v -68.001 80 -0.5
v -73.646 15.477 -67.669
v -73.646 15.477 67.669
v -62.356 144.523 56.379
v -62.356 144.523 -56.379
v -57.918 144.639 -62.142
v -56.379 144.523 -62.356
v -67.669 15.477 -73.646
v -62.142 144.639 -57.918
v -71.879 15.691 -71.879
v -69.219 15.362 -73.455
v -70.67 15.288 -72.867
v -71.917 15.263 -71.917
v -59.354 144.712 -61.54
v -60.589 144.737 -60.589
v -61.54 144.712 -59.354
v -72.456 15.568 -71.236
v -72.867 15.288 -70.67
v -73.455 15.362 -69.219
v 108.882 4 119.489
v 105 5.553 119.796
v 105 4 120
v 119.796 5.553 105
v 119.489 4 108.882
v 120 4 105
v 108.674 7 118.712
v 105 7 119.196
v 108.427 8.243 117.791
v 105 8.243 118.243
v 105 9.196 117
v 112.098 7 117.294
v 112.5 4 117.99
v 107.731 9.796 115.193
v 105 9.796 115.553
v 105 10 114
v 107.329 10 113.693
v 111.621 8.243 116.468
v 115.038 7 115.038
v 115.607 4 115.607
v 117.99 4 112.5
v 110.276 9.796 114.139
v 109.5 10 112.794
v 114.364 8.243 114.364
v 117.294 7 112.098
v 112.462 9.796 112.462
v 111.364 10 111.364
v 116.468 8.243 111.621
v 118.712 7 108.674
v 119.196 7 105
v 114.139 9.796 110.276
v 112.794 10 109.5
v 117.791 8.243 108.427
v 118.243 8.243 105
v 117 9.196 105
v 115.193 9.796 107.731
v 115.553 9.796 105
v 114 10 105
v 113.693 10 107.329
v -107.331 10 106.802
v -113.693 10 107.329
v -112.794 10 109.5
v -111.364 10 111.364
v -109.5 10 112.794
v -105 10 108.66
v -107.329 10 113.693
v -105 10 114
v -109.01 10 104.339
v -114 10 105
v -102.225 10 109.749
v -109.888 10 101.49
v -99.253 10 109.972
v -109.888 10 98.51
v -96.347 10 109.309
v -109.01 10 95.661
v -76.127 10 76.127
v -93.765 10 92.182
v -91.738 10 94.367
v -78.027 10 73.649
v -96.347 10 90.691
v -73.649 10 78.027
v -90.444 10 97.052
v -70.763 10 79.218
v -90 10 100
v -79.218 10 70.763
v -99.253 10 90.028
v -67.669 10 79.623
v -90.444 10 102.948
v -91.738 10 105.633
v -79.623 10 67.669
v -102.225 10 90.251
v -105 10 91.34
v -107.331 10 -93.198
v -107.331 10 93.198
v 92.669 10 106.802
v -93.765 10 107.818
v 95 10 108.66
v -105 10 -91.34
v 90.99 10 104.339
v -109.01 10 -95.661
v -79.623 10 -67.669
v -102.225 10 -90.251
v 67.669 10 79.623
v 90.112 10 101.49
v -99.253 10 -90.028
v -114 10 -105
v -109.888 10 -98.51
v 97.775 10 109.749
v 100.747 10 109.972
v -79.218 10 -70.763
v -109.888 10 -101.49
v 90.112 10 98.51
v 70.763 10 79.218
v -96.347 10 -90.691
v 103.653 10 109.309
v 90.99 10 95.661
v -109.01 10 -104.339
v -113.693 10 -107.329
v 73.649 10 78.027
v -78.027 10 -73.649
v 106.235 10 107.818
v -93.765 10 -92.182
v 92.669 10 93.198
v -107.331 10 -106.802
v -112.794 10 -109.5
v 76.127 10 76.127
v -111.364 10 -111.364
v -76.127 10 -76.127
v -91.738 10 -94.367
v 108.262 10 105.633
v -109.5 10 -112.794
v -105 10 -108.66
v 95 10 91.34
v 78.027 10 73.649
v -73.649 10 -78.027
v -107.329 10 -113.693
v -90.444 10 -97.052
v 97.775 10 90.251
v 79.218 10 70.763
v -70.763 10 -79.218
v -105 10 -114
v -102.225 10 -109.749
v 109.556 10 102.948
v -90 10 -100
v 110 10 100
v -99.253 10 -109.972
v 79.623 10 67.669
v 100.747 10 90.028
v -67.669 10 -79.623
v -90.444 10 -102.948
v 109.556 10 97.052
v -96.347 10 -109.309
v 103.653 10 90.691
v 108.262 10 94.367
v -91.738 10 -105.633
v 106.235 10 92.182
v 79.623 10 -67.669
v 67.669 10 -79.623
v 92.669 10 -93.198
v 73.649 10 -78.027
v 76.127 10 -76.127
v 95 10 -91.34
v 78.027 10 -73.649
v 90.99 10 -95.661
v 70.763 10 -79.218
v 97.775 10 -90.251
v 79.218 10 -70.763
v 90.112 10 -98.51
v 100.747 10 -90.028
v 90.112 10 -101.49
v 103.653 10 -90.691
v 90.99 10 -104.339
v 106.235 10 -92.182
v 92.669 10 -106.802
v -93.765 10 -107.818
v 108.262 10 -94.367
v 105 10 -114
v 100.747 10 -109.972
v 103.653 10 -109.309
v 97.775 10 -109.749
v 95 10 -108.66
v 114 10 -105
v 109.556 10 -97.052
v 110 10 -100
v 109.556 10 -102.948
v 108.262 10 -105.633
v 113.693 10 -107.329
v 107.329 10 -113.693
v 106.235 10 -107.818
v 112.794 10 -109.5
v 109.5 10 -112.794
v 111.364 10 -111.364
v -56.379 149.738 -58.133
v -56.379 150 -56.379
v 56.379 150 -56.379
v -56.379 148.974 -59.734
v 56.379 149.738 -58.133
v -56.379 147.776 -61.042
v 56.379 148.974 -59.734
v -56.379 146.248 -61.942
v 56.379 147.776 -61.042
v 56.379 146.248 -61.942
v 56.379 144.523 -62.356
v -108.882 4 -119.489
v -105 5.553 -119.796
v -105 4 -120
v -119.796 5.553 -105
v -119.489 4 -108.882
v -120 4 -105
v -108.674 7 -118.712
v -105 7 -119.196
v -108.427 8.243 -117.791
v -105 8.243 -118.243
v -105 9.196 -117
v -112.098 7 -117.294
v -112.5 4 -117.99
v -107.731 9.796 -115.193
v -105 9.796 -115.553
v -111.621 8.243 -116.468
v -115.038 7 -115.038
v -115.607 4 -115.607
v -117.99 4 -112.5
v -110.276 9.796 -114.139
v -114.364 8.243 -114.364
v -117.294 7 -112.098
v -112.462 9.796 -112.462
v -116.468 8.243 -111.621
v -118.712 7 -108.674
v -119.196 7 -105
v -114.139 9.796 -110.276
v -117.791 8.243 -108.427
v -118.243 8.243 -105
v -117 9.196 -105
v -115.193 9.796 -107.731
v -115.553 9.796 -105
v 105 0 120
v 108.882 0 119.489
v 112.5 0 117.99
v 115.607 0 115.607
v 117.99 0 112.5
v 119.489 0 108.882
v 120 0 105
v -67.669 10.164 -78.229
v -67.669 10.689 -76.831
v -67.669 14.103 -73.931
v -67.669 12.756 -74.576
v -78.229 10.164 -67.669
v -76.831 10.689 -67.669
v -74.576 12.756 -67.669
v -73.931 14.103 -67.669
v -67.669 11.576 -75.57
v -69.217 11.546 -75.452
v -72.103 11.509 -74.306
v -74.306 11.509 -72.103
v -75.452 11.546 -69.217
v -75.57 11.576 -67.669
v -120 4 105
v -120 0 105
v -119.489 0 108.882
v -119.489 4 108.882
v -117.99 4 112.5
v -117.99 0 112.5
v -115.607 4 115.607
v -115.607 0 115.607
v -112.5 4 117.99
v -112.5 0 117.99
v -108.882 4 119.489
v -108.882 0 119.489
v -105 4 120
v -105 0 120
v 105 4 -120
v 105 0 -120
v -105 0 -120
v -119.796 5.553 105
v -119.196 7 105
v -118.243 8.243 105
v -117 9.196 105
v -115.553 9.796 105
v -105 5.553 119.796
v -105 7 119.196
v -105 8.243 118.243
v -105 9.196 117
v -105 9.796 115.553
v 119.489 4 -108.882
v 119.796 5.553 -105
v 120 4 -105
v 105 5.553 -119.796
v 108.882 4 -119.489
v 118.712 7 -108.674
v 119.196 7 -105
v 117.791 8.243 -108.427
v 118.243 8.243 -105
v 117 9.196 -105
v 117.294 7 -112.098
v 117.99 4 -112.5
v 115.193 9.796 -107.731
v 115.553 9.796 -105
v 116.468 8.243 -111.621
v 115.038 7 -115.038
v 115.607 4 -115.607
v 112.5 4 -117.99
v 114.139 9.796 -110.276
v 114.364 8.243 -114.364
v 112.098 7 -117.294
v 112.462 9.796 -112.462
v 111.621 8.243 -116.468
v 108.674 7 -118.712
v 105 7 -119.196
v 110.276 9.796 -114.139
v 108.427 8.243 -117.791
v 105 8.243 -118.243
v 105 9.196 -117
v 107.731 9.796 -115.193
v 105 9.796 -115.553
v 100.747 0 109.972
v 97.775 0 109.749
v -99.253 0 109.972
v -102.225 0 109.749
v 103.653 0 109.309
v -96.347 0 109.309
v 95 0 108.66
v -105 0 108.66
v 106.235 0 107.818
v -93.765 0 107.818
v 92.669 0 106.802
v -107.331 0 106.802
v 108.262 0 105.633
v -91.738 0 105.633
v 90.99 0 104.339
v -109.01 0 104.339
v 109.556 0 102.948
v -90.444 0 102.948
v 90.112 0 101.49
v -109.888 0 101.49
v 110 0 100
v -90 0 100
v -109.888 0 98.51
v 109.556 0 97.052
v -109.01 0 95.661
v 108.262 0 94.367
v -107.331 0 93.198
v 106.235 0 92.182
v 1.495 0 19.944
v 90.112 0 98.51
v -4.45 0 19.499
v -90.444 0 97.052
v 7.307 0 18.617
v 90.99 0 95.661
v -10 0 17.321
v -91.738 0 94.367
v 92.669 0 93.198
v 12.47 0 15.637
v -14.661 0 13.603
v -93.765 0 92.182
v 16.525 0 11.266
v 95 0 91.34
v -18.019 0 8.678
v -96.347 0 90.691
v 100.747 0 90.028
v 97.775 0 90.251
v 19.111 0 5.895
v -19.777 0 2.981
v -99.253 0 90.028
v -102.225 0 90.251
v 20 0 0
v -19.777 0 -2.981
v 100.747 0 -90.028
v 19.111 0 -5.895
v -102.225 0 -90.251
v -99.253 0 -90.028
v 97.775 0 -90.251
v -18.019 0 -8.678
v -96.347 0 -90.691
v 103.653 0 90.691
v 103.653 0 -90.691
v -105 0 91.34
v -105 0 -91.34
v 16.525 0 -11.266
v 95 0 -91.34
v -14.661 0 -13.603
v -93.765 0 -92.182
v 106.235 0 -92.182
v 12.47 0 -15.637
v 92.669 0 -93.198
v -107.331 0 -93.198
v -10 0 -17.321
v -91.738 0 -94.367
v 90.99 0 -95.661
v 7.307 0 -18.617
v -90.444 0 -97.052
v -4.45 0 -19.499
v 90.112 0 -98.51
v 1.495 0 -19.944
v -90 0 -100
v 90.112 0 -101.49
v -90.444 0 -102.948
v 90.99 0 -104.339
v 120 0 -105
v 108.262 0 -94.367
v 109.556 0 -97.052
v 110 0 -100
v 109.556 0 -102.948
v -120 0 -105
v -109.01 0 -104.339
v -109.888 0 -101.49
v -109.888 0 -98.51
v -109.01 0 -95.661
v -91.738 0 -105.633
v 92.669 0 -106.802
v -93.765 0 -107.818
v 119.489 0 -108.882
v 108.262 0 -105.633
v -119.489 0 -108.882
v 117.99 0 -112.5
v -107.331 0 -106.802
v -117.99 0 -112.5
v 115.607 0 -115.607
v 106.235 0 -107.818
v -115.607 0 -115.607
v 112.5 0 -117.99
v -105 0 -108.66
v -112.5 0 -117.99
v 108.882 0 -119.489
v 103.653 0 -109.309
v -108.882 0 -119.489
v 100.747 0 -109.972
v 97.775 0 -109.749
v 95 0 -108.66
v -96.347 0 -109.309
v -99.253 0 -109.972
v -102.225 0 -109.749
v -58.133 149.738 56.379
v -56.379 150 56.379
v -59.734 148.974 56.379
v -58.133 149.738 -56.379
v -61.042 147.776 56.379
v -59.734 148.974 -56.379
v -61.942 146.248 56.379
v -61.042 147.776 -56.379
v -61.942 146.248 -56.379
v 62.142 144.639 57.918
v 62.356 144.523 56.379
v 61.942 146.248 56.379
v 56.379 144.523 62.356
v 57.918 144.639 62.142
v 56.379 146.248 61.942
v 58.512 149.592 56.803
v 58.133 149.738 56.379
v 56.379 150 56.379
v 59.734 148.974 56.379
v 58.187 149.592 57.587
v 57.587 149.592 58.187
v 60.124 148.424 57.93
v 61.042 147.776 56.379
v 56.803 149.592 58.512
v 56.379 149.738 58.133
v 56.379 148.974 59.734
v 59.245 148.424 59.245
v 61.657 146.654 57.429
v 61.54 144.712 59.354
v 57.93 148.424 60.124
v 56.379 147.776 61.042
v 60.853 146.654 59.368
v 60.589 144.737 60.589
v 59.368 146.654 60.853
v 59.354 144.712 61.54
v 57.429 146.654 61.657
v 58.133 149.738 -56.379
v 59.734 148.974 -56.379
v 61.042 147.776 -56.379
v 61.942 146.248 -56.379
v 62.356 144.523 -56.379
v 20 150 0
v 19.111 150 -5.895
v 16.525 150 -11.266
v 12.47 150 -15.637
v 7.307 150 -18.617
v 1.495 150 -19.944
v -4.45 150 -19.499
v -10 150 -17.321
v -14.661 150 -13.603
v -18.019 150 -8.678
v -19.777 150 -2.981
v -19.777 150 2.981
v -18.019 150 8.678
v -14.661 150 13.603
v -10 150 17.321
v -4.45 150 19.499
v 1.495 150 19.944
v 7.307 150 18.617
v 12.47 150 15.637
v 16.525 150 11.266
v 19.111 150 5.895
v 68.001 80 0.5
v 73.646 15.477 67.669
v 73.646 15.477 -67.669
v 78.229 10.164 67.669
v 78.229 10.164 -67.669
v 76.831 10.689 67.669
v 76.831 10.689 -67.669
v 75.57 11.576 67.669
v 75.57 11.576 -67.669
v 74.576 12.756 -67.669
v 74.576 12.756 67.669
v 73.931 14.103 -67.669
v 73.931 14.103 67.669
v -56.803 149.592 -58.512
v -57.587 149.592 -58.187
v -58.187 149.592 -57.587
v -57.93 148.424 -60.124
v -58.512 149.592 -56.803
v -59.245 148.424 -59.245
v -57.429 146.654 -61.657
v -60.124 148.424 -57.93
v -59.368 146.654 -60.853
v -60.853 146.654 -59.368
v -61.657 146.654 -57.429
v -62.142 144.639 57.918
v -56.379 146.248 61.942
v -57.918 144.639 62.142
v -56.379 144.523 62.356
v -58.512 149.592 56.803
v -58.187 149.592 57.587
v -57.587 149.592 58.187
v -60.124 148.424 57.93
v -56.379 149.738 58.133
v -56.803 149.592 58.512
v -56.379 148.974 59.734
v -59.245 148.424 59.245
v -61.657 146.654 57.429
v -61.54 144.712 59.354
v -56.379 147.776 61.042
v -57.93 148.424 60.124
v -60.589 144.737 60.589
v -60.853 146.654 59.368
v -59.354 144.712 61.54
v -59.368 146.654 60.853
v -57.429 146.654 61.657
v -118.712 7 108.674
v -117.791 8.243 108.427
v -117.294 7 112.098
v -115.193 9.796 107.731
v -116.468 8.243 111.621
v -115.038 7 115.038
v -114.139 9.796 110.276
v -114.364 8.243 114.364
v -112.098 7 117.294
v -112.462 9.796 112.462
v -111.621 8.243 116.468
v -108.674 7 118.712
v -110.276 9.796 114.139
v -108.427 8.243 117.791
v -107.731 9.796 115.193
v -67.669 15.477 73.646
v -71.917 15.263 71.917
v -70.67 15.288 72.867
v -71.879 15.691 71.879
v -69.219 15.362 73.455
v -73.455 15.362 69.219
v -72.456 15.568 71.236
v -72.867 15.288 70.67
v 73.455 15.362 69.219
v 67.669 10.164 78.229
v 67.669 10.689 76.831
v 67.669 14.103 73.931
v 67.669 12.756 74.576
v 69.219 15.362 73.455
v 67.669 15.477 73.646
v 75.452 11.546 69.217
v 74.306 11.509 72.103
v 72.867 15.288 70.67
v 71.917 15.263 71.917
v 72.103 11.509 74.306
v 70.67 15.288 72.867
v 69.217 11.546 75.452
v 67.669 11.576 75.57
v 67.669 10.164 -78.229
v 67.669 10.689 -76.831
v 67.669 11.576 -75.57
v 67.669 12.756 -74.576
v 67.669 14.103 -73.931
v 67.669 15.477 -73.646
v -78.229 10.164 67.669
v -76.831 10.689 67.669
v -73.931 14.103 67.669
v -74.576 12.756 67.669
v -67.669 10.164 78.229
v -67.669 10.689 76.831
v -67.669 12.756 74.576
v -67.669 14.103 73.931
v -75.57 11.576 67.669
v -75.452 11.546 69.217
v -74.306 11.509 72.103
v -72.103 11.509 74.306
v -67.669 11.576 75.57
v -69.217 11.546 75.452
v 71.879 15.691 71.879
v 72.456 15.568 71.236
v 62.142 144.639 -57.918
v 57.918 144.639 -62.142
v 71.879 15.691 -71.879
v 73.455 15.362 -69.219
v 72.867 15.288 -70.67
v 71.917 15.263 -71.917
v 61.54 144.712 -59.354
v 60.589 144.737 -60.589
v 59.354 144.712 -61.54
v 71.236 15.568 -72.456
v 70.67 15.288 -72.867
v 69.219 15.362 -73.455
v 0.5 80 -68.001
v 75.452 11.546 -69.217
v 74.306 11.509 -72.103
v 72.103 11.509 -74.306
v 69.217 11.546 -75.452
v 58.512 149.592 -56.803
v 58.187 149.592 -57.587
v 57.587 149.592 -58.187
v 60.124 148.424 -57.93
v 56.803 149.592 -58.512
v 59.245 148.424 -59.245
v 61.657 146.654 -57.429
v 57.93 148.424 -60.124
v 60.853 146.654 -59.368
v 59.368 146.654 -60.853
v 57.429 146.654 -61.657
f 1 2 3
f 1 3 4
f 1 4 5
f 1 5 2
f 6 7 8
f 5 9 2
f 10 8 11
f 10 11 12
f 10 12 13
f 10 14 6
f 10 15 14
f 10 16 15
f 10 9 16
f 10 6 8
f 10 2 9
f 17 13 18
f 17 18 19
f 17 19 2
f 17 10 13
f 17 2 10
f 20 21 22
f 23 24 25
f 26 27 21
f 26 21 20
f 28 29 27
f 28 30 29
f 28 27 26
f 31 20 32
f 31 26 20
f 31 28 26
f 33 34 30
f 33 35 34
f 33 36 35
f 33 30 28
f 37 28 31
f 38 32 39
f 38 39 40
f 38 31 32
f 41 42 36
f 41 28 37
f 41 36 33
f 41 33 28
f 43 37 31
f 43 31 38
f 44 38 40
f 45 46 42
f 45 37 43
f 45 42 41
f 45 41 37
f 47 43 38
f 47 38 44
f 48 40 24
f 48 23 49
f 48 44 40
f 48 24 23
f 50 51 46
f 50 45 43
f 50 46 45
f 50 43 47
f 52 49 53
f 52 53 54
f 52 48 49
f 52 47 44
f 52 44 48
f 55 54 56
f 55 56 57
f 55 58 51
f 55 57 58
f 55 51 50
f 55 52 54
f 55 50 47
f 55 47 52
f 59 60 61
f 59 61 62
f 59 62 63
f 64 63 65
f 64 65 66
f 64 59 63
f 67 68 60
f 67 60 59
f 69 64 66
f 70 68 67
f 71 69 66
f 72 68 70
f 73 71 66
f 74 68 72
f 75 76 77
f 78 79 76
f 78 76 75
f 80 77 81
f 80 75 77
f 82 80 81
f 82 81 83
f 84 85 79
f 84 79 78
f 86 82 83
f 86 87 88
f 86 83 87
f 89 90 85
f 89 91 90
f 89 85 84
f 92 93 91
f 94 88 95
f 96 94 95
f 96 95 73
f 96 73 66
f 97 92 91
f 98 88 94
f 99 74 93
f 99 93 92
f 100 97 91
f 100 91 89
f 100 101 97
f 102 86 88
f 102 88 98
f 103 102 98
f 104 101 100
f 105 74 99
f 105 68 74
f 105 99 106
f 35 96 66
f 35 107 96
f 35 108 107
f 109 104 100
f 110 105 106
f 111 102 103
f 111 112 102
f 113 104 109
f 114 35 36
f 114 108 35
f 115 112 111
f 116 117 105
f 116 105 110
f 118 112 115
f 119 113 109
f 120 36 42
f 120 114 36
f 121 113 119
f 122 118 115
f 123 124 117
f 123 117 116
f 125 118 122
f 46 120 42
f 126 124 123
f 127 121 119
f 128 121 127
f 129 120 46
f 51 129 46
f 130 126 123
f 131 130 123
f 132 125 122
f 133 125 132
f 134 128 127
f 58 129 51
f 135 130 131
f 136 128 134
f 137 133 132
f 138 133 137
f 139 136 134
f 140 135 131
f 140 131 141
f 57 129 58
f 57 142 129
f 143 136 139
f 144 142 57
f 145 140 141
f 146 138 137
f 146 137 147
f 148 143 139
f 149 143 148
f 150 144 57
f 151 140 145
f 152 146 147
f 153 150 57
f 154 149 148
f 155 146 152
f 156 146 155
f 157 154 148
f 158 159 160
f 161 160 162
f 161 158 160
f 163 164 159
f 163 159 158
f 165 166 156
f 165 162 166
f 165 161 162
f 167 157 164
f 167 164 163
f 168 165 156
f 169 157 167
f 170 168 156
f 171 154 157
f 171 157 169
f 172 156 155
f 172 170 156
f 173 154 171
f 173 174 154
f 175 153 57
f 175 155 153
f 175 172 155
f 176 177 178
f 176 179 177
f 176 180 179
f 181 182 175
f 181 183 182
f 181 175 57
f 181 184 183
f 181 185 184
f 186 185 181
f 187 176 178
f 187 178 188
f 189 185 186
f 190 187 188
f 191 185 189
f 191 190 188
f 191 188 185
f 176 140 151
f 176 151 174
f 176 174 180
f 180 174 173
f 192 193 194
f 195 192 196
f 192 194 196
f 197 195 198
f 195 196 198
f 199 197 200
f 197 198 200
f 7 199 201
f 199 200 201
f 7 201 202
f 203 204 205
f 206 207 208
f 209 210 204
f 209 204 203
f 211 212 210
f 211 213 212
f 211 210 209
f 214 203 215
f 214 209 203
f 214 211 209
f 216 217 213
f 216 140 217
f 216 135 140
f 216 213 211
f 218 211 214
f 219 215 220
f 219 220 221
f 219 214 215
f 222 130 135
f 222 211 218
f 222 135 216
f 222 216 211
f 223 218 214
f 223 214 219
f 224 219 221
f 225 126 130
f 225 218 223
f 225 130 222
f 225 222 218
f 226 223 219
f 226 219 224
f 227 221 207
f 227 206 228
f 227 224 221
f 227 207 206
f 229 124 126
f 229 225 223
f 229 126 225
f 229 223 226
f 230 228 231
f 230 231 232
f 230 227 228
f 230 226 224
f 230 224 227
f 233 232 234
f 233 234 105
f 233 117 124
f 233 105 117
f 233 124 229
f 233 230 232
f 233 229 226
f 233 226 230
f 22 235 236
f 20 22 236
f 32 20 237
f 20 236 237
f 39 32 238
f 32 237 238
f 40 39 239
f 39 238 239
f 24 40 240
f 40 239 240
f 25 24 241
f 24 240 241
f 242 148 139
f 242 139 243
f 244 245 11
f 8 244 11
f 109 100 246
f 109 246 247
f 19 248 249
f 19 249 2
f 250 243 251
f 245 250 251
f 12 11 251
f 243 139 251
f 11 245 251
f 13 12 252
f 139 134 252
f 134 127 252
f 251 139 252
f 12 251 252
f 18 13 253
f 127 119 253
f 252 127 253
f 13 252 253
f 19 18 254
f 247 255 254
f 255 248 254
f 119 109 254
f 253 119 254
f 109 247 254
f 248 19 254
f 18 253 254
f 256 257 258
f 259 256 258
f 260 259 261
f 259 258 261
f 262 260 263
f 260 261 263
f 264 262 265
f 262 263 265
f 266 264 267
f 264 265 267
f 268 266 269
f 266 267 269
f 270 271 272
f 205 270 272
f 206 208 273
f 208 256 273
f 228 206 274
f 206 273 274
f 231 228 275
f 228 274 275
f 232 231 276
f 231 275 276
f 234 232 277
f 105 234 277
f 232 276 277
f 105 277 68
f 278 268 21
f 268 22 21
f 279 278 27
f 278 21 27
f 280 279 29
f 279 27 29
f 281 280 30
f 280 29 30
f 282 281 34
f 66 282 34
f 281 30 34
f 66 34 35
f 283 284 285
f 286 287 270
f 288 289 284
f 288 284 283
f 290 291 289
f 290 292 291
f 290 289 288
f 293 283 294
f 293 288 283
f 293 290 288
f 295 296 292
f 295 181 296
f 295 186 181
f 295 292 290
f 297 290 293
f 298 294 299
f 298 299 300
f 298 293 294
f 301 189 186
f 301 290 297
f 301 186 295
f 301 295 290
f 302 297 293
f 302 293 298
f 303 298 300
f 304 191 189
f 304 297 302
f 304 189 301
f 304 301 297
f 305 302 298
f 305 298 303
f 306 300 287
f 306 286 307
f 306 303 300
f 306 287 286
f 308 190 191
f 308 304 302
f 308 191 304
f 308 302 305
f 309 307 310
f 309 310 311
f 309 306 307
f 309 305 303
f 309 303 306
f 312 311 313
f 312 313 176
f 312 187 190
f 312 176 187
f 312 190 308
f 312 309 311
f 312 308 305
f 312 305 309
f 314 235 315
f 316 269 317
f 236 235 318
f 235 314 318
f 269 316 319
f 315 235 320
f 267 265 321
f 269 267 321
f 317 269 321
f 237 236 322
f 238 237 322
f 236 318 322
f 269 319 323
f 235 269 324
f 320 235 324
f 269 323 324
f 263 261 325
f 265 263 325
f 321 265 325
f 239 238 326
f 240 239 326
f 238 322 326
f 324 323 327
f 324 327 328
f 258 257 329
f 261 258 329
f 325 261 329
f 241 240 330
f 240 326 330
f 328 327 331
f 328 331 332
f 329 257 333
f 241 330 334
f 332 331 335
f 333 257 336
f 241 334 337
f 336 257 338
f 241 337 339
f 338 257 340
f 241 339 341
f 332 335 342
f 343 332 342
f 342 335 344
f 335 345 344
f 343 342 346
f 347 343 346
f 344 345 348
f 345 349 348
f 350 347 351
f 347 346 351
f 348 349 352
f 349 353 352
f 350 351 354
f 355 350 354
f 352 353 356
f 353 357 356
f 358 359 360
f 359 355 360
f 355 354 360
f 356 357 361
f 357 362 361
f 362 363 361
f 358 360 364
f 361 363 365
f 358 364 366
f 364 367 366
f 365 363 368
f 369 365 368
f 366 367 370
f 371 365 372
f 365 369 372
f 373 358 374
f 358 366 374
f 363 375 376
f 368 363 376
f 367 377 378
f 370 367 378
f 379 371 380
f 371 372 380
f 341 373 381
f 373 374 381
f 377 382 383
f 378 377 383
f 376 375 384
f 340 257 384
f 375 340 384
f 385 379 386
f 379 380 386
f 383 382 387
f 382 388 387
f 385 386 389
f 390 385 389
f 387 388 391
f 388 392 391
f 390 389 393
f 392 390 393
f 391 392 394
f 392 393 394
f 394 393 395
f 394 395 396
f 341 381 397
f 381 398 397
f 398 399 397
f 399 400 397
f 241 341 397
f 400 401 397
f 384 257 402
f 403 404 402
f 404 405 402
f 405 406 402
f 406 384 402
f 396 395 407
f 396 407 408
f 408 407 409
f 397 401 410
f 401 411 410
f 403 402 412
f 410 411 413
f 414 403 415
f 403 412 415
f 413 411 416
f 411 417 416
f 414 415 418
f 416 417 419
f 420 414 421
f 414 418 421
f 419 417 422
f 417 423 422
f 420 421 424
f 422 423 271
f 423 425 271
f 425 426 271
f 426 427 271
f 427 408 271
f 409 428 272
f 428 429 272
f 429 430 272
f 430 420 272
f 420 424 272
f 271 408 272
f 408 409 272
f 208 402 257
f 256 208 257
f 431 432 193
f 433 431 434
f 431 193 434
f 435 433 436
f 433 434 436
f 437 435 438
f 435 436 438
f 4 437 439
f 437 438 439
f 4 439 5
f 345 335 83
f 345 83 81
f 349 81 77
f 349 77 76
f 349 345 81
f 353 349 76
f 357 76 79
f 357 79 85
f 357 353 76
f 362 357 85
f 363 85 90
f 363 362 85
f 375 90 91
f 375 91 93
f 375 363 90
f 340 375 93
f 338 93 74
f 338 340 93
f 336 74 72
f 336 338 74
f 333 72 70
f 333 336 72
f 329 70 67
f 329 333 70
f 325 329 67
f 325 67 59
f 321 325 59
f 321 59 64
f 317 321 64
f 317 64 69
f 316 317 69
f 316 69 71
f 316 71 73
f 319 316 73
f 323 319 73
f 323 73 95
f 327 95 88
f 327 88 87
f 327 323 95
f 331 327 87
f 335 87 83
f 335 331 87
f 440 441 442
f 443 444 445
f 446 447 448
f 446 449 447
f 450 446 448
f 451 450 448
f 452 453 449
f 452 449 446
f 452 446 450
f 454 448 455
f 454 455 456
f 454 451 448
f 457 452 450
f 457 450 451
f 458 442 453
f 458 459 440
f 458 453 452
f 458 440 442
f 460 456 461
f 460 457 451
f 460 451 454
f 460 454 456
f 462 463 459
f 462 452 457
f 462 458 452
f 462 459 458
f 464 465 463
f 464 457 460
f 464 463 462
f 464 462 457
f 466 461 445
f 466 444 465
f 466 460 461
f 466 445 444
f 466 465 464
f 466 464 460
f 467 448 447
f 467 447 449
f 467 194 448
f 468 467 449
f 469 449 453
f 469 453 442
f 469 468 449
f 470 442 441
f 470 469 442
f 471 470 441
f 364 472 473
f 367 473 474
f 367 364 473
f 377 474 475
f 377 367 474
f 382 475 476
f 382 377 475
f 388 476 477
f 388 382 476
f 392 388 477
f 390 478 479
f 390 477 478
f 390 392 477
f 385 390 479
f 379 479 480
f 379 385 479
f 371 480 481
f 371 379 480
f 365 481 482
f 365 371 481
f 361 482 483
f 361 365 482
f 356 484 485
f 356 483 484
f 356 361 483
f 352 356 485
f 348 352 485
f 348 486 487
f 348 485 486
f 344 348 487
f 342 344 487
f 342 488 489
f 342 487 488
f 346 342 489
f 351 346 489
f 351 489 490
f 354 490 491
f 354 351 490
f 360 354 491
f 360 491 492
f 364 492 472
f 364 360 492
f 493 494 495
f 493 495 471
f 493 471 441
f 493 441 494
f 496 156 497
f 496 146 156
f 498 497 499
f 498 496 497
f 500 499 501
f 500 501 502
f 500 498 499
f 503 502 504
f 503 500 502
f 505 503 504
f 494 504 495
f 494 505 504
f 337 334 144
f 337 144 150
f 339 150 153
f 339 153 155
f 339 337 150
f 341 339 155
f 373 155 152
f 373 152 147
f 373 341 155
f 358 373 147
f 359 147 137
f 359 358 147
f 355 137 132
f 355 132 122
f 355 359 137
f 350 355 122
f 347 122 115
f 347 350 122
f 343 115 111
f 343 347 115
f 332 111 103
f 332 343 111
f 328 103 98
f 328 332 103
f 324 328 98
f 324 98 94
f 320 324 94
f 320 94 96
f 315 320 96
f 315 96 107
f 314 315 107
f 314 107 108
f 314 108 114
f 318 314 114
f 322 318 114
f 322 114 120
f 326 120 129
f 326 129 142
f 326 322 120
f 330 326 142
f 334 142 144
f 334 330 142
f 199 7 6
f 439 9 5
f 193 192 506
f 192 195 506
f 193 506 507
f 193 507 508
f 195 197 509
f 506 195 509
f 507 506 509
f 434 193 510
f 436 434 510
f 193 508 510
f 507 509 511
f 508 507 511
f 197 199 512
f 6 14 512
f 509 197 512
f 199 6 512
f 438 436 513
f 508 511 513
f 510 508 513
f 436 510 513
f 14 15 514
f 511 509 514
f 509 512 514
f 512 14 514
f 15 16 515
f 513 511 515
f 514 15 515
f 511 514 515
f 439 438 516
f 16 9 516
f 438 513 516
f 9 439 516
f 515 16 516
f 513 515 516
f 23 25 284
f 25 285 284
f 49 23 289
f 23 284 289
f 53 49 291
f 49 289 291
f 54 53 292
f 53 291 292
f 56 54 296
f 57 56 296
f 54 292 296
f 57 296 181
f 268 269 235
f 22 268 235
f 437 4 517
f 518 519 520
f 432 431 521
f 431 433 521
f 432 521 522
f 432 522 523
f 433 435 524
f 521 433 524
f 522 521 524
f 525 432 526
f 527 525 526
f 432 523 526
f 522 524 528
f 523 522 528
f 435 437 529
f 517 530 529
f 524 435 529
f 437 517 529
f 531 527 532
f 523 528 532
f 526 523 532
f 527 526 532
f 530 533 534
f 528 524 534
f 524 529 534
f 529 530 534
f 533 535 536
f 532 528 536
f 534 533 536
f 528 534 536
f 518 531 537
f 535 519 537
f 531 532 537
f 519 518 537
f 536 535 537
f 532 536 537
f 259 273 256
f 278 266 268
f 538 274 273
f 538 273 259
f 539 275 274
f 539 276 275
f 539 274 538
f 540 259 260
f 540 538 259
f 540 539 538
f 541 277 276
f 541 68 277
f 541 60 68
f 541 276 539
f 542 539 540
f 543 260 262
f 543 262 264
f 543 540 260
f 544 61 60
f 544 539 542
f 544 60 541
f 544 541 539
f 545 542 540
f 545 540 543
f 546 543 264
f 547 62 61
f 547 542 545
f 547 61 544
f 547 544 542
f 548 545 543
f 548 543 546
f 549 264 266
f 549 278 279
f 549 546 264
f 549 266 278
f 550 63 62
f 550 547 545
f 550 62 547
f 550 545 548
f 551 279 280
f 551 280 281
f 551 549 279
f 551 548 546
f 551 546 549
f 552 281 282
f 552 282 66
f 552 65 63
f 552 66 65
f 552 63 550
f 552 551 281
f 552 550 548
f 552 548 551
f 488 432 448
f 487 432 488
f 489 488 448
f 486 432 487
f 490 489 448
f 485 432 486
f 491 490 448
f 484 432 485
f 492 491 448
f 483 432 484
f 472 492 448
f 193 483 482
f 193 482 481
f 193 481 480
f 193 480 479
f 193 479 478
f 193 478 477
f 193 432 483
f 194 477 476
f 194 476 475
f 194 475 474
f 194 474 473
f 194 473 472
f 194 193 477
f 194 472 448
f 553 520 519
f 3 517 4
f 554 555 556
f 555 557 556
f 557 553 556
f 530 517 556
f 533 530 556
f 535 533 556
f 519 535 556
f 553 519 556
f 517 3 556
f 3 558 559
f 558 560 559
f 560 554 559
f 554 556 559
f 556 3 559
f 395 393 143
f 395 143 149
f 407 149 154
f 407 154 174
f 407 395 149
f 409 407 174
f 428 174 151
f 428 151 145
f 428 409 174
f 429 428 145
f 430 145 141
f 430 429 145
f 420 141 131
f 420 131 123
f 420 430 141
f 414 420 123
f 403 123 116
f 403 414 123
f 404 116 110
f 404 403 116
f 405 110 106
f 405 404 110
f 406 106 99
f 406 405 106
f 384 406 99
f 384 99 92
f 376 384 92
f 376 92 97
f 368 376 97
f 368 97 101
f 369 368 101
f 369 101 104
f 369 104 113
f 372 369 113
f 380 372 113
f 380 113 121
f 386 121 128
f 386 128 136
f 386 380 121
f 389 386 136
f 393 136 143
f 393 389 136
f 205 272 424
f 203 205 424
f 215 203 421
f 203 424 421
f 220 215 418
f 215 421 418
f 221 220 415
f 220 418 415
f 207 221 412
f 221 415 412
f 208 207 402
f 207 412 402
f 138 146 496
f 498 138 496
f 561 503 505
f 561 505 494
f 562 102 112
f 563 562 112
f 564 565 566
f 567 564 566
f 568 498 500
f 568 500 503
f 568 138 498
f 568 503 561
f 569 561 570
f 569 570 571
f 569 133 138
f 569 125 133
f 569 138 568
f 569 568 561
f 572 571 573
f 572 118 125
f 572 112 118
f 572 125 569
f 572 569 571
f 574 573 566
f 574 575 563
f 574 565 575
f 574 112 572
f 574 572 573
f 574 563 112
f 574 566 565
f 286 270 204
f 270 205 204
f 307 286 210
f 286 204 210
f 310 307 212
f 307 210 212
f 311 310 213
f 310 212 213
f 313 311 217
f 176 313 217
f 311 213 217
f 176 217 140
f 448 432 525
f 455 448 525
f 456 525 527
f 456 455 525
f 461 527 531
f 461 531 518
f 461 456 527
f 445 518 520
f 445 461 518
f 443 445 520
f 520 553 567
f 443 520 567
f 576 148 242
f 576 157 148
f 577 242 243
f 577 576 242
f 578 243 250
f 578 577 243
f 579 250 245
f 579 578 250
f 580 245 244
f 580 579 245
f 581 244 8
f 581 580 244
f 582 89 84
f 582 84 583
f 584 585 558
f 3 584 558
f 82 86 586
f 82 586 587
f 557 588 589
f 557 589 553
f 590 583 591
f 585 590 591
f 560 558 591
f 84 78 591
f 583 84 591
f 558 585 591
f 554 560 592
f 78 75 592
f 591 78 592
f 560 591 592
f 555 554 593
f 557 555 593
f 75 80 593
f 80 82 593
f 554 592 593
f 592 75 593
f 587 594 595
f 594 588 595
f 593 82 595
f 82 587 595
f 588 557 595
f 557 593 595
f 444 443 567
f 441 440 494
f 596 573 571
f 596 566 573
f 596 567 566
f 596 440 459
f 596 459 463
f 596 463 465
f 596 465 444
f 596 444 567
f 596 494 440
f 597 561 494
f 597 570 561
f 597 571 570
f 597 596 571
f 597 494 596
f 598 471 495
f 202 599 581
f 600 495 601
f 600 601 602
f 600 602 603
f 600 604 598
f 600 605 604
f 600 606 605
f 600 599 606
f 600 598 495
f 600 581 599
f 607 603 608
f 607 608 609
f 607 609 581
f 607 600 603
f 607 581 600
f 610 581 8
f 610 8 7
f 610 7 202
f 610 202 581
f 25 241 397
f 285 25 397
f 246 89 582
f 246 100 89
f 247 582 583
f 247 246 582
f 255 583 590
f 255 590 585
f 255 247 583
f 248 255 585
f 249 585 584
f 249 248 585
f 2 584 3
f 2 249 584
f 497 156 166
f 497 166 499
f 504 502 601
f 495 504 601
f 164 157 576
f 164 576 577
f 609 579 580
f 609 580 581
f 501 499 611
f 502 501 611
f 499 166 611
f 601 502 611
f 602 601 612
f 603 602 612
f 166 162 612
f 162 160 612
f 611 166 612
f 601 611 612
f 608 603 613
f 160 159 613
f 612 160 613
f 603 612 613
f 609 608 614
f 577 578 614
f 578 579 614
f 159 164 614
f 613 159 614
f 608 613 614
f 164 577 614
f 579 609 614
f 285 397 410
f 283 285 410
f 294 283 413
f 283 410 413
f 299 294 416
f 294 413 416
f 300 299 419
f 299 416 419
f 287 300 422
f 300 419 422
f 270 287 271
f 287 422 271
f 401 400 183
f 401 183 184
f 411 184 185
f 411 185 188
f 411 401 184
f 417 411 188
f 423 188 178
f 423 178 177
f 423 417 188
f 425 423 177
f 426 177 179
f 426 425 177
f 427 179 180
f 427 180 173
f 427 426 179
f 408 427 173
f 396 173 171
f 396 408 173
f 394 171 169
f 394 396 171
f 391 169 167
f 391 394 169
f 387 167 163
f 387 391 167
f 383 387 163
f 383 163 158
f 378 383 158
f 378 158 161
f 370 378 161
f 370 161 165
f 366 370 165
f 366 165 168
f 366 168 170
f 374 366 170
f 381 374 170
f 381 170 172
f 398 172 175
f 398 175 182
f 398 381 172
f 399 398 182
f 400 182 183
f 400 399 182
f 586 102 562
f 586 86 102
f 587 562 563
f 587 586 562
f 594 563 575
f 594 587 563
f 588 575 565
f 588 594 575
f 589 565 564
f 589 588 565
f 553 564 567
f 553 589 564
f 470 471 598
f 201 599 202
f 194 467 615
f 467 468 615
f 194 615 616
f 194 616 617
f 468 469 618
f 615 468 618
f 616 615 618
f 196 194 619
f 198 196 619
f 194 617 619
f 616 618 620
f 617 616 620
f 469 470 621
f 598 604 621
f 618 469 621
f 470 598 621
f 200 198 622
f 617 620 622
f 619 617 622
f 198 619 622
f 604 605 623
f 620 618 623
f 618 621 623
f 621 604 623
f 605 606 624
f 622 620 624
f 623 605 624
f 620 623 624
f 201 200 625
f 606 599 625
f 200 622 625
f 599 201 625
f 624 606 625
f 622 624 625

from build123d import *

# Parameters (mm, degrees)
SKETCH1_R           = 10
BOSS_EXTRUDE1_DEPTH = 10
SKETCH2_W           = 150
SKETCH2_H           = 150
BOSS_EXTRUDE2_DEPTH = 150
BOSS_EXTRUDE2_TAPER = 5
SKETCH3_R           = 20
CUT_EXTRUDE1_DEPTH  = 151.0000001
FILLET1_R           = 6


with BuildPart() as part:
    # Sketch1 → Boss-Extrude1 (new body)
    with BuildSketch(Plane(origin=(0, 0, 0), x_dir=(1, 0, 0), z_dir=(0, 1, 0))):
        with BuildLine():
            ThreePointArc((-120, -105), (-115.606601718, -115.606601718), (-105, -120))
            Line((-105, -120), (105, -120))
            ThreePointArc((105, -120), (115.606601718, -115.606601718), (120, -105))
            Line((120, -105), (120, 105))
            ThreePointArc((120, 105), (115.606601718, 115.606601718), (105, 120))
            Line((105, 120), (-105, 120))
            ThreePointArc((-105, 120), (-115.606601718, 115.606601718), (-120, 105))
            Line((-120, 105), (-120, -105))
        make_face()
        with Locations((-100, -100)):
            Circle(SKETCH1_R, mode=Mode.SUBTRACT)
        with Locations((100, -100)):
            Circle(SKETCH1_R, mode=Mode.SUBTRACT)
        with Locations((-100, 100)):
            Circle(SKETCH1_R, mode=Mode.SUBTRACT)
        with Locations((100, 100)):
            Circle(SKETCH1_R, mode=Mode.SUBTRACT)
    extrude(amount=BOSS_EXTRUDE1_DEPTH)

    # Sketch2 → Boss-Extrude2 (add)
    with BuildSketch(Plane(origin=(0, 0, 0), x_dir=(1, 0, 0), z_dir=(0, 1, 0))):
        Rectangle(SKETCH2_W, SKETCH2_H)
    extrude(amount=BOSS_EXTRUDE2_DEPTH, taper=BOSS_EXTRUDE2_TAPER)

    # Sketch3 → Cut-Extrude1 (cut, through all)
    with BuildSketch(Plane(origin=(0, 0, 0), x_dir=(1, 0, 0), z_dir=(0, 1, 0))):
        Circle(SKETCH3_R)
    extrude(amount=CUT_EXTRUDE1_DEPTH, mode=Mode.SUBTRACT)

    # Fillet1
    fillet1_edges = [part.edges().sort_by_distance(p)[0] for p in [
        (-120, 10, 0),
        (-115.606601718, 10, 115.606601718),
        (0, 10, 120),
        (115.606601718, 10, 115.606601718),
        (120, 10, 0),
        (115.606601718, 10, -115.606601718),
        (0, 10, -120),
        (74.125113365, 10, 0),
        (0, 10, -74.125113365),
        (-74.125113365, 10, 0),
        (0, 10, 74.125113365),
        (68.000906918, 80, 68.000906918),
        (68.000906918, 80, -68.000906918),
        (-68.000906918, 80, -68.000906918),
        (-68.000906918, 80, 68.000906918),
        (61.876700471, 150, 0),
        (0, 150, -61.876700471),
        (-61.876700471, 150, 0),
        (0, 150, 61.876700471),
        (-115.606601718, 10, -115.606601718),
    ]]
    fillet(fillet1_edges, radius=FILLET1_R)


solid = part.part
